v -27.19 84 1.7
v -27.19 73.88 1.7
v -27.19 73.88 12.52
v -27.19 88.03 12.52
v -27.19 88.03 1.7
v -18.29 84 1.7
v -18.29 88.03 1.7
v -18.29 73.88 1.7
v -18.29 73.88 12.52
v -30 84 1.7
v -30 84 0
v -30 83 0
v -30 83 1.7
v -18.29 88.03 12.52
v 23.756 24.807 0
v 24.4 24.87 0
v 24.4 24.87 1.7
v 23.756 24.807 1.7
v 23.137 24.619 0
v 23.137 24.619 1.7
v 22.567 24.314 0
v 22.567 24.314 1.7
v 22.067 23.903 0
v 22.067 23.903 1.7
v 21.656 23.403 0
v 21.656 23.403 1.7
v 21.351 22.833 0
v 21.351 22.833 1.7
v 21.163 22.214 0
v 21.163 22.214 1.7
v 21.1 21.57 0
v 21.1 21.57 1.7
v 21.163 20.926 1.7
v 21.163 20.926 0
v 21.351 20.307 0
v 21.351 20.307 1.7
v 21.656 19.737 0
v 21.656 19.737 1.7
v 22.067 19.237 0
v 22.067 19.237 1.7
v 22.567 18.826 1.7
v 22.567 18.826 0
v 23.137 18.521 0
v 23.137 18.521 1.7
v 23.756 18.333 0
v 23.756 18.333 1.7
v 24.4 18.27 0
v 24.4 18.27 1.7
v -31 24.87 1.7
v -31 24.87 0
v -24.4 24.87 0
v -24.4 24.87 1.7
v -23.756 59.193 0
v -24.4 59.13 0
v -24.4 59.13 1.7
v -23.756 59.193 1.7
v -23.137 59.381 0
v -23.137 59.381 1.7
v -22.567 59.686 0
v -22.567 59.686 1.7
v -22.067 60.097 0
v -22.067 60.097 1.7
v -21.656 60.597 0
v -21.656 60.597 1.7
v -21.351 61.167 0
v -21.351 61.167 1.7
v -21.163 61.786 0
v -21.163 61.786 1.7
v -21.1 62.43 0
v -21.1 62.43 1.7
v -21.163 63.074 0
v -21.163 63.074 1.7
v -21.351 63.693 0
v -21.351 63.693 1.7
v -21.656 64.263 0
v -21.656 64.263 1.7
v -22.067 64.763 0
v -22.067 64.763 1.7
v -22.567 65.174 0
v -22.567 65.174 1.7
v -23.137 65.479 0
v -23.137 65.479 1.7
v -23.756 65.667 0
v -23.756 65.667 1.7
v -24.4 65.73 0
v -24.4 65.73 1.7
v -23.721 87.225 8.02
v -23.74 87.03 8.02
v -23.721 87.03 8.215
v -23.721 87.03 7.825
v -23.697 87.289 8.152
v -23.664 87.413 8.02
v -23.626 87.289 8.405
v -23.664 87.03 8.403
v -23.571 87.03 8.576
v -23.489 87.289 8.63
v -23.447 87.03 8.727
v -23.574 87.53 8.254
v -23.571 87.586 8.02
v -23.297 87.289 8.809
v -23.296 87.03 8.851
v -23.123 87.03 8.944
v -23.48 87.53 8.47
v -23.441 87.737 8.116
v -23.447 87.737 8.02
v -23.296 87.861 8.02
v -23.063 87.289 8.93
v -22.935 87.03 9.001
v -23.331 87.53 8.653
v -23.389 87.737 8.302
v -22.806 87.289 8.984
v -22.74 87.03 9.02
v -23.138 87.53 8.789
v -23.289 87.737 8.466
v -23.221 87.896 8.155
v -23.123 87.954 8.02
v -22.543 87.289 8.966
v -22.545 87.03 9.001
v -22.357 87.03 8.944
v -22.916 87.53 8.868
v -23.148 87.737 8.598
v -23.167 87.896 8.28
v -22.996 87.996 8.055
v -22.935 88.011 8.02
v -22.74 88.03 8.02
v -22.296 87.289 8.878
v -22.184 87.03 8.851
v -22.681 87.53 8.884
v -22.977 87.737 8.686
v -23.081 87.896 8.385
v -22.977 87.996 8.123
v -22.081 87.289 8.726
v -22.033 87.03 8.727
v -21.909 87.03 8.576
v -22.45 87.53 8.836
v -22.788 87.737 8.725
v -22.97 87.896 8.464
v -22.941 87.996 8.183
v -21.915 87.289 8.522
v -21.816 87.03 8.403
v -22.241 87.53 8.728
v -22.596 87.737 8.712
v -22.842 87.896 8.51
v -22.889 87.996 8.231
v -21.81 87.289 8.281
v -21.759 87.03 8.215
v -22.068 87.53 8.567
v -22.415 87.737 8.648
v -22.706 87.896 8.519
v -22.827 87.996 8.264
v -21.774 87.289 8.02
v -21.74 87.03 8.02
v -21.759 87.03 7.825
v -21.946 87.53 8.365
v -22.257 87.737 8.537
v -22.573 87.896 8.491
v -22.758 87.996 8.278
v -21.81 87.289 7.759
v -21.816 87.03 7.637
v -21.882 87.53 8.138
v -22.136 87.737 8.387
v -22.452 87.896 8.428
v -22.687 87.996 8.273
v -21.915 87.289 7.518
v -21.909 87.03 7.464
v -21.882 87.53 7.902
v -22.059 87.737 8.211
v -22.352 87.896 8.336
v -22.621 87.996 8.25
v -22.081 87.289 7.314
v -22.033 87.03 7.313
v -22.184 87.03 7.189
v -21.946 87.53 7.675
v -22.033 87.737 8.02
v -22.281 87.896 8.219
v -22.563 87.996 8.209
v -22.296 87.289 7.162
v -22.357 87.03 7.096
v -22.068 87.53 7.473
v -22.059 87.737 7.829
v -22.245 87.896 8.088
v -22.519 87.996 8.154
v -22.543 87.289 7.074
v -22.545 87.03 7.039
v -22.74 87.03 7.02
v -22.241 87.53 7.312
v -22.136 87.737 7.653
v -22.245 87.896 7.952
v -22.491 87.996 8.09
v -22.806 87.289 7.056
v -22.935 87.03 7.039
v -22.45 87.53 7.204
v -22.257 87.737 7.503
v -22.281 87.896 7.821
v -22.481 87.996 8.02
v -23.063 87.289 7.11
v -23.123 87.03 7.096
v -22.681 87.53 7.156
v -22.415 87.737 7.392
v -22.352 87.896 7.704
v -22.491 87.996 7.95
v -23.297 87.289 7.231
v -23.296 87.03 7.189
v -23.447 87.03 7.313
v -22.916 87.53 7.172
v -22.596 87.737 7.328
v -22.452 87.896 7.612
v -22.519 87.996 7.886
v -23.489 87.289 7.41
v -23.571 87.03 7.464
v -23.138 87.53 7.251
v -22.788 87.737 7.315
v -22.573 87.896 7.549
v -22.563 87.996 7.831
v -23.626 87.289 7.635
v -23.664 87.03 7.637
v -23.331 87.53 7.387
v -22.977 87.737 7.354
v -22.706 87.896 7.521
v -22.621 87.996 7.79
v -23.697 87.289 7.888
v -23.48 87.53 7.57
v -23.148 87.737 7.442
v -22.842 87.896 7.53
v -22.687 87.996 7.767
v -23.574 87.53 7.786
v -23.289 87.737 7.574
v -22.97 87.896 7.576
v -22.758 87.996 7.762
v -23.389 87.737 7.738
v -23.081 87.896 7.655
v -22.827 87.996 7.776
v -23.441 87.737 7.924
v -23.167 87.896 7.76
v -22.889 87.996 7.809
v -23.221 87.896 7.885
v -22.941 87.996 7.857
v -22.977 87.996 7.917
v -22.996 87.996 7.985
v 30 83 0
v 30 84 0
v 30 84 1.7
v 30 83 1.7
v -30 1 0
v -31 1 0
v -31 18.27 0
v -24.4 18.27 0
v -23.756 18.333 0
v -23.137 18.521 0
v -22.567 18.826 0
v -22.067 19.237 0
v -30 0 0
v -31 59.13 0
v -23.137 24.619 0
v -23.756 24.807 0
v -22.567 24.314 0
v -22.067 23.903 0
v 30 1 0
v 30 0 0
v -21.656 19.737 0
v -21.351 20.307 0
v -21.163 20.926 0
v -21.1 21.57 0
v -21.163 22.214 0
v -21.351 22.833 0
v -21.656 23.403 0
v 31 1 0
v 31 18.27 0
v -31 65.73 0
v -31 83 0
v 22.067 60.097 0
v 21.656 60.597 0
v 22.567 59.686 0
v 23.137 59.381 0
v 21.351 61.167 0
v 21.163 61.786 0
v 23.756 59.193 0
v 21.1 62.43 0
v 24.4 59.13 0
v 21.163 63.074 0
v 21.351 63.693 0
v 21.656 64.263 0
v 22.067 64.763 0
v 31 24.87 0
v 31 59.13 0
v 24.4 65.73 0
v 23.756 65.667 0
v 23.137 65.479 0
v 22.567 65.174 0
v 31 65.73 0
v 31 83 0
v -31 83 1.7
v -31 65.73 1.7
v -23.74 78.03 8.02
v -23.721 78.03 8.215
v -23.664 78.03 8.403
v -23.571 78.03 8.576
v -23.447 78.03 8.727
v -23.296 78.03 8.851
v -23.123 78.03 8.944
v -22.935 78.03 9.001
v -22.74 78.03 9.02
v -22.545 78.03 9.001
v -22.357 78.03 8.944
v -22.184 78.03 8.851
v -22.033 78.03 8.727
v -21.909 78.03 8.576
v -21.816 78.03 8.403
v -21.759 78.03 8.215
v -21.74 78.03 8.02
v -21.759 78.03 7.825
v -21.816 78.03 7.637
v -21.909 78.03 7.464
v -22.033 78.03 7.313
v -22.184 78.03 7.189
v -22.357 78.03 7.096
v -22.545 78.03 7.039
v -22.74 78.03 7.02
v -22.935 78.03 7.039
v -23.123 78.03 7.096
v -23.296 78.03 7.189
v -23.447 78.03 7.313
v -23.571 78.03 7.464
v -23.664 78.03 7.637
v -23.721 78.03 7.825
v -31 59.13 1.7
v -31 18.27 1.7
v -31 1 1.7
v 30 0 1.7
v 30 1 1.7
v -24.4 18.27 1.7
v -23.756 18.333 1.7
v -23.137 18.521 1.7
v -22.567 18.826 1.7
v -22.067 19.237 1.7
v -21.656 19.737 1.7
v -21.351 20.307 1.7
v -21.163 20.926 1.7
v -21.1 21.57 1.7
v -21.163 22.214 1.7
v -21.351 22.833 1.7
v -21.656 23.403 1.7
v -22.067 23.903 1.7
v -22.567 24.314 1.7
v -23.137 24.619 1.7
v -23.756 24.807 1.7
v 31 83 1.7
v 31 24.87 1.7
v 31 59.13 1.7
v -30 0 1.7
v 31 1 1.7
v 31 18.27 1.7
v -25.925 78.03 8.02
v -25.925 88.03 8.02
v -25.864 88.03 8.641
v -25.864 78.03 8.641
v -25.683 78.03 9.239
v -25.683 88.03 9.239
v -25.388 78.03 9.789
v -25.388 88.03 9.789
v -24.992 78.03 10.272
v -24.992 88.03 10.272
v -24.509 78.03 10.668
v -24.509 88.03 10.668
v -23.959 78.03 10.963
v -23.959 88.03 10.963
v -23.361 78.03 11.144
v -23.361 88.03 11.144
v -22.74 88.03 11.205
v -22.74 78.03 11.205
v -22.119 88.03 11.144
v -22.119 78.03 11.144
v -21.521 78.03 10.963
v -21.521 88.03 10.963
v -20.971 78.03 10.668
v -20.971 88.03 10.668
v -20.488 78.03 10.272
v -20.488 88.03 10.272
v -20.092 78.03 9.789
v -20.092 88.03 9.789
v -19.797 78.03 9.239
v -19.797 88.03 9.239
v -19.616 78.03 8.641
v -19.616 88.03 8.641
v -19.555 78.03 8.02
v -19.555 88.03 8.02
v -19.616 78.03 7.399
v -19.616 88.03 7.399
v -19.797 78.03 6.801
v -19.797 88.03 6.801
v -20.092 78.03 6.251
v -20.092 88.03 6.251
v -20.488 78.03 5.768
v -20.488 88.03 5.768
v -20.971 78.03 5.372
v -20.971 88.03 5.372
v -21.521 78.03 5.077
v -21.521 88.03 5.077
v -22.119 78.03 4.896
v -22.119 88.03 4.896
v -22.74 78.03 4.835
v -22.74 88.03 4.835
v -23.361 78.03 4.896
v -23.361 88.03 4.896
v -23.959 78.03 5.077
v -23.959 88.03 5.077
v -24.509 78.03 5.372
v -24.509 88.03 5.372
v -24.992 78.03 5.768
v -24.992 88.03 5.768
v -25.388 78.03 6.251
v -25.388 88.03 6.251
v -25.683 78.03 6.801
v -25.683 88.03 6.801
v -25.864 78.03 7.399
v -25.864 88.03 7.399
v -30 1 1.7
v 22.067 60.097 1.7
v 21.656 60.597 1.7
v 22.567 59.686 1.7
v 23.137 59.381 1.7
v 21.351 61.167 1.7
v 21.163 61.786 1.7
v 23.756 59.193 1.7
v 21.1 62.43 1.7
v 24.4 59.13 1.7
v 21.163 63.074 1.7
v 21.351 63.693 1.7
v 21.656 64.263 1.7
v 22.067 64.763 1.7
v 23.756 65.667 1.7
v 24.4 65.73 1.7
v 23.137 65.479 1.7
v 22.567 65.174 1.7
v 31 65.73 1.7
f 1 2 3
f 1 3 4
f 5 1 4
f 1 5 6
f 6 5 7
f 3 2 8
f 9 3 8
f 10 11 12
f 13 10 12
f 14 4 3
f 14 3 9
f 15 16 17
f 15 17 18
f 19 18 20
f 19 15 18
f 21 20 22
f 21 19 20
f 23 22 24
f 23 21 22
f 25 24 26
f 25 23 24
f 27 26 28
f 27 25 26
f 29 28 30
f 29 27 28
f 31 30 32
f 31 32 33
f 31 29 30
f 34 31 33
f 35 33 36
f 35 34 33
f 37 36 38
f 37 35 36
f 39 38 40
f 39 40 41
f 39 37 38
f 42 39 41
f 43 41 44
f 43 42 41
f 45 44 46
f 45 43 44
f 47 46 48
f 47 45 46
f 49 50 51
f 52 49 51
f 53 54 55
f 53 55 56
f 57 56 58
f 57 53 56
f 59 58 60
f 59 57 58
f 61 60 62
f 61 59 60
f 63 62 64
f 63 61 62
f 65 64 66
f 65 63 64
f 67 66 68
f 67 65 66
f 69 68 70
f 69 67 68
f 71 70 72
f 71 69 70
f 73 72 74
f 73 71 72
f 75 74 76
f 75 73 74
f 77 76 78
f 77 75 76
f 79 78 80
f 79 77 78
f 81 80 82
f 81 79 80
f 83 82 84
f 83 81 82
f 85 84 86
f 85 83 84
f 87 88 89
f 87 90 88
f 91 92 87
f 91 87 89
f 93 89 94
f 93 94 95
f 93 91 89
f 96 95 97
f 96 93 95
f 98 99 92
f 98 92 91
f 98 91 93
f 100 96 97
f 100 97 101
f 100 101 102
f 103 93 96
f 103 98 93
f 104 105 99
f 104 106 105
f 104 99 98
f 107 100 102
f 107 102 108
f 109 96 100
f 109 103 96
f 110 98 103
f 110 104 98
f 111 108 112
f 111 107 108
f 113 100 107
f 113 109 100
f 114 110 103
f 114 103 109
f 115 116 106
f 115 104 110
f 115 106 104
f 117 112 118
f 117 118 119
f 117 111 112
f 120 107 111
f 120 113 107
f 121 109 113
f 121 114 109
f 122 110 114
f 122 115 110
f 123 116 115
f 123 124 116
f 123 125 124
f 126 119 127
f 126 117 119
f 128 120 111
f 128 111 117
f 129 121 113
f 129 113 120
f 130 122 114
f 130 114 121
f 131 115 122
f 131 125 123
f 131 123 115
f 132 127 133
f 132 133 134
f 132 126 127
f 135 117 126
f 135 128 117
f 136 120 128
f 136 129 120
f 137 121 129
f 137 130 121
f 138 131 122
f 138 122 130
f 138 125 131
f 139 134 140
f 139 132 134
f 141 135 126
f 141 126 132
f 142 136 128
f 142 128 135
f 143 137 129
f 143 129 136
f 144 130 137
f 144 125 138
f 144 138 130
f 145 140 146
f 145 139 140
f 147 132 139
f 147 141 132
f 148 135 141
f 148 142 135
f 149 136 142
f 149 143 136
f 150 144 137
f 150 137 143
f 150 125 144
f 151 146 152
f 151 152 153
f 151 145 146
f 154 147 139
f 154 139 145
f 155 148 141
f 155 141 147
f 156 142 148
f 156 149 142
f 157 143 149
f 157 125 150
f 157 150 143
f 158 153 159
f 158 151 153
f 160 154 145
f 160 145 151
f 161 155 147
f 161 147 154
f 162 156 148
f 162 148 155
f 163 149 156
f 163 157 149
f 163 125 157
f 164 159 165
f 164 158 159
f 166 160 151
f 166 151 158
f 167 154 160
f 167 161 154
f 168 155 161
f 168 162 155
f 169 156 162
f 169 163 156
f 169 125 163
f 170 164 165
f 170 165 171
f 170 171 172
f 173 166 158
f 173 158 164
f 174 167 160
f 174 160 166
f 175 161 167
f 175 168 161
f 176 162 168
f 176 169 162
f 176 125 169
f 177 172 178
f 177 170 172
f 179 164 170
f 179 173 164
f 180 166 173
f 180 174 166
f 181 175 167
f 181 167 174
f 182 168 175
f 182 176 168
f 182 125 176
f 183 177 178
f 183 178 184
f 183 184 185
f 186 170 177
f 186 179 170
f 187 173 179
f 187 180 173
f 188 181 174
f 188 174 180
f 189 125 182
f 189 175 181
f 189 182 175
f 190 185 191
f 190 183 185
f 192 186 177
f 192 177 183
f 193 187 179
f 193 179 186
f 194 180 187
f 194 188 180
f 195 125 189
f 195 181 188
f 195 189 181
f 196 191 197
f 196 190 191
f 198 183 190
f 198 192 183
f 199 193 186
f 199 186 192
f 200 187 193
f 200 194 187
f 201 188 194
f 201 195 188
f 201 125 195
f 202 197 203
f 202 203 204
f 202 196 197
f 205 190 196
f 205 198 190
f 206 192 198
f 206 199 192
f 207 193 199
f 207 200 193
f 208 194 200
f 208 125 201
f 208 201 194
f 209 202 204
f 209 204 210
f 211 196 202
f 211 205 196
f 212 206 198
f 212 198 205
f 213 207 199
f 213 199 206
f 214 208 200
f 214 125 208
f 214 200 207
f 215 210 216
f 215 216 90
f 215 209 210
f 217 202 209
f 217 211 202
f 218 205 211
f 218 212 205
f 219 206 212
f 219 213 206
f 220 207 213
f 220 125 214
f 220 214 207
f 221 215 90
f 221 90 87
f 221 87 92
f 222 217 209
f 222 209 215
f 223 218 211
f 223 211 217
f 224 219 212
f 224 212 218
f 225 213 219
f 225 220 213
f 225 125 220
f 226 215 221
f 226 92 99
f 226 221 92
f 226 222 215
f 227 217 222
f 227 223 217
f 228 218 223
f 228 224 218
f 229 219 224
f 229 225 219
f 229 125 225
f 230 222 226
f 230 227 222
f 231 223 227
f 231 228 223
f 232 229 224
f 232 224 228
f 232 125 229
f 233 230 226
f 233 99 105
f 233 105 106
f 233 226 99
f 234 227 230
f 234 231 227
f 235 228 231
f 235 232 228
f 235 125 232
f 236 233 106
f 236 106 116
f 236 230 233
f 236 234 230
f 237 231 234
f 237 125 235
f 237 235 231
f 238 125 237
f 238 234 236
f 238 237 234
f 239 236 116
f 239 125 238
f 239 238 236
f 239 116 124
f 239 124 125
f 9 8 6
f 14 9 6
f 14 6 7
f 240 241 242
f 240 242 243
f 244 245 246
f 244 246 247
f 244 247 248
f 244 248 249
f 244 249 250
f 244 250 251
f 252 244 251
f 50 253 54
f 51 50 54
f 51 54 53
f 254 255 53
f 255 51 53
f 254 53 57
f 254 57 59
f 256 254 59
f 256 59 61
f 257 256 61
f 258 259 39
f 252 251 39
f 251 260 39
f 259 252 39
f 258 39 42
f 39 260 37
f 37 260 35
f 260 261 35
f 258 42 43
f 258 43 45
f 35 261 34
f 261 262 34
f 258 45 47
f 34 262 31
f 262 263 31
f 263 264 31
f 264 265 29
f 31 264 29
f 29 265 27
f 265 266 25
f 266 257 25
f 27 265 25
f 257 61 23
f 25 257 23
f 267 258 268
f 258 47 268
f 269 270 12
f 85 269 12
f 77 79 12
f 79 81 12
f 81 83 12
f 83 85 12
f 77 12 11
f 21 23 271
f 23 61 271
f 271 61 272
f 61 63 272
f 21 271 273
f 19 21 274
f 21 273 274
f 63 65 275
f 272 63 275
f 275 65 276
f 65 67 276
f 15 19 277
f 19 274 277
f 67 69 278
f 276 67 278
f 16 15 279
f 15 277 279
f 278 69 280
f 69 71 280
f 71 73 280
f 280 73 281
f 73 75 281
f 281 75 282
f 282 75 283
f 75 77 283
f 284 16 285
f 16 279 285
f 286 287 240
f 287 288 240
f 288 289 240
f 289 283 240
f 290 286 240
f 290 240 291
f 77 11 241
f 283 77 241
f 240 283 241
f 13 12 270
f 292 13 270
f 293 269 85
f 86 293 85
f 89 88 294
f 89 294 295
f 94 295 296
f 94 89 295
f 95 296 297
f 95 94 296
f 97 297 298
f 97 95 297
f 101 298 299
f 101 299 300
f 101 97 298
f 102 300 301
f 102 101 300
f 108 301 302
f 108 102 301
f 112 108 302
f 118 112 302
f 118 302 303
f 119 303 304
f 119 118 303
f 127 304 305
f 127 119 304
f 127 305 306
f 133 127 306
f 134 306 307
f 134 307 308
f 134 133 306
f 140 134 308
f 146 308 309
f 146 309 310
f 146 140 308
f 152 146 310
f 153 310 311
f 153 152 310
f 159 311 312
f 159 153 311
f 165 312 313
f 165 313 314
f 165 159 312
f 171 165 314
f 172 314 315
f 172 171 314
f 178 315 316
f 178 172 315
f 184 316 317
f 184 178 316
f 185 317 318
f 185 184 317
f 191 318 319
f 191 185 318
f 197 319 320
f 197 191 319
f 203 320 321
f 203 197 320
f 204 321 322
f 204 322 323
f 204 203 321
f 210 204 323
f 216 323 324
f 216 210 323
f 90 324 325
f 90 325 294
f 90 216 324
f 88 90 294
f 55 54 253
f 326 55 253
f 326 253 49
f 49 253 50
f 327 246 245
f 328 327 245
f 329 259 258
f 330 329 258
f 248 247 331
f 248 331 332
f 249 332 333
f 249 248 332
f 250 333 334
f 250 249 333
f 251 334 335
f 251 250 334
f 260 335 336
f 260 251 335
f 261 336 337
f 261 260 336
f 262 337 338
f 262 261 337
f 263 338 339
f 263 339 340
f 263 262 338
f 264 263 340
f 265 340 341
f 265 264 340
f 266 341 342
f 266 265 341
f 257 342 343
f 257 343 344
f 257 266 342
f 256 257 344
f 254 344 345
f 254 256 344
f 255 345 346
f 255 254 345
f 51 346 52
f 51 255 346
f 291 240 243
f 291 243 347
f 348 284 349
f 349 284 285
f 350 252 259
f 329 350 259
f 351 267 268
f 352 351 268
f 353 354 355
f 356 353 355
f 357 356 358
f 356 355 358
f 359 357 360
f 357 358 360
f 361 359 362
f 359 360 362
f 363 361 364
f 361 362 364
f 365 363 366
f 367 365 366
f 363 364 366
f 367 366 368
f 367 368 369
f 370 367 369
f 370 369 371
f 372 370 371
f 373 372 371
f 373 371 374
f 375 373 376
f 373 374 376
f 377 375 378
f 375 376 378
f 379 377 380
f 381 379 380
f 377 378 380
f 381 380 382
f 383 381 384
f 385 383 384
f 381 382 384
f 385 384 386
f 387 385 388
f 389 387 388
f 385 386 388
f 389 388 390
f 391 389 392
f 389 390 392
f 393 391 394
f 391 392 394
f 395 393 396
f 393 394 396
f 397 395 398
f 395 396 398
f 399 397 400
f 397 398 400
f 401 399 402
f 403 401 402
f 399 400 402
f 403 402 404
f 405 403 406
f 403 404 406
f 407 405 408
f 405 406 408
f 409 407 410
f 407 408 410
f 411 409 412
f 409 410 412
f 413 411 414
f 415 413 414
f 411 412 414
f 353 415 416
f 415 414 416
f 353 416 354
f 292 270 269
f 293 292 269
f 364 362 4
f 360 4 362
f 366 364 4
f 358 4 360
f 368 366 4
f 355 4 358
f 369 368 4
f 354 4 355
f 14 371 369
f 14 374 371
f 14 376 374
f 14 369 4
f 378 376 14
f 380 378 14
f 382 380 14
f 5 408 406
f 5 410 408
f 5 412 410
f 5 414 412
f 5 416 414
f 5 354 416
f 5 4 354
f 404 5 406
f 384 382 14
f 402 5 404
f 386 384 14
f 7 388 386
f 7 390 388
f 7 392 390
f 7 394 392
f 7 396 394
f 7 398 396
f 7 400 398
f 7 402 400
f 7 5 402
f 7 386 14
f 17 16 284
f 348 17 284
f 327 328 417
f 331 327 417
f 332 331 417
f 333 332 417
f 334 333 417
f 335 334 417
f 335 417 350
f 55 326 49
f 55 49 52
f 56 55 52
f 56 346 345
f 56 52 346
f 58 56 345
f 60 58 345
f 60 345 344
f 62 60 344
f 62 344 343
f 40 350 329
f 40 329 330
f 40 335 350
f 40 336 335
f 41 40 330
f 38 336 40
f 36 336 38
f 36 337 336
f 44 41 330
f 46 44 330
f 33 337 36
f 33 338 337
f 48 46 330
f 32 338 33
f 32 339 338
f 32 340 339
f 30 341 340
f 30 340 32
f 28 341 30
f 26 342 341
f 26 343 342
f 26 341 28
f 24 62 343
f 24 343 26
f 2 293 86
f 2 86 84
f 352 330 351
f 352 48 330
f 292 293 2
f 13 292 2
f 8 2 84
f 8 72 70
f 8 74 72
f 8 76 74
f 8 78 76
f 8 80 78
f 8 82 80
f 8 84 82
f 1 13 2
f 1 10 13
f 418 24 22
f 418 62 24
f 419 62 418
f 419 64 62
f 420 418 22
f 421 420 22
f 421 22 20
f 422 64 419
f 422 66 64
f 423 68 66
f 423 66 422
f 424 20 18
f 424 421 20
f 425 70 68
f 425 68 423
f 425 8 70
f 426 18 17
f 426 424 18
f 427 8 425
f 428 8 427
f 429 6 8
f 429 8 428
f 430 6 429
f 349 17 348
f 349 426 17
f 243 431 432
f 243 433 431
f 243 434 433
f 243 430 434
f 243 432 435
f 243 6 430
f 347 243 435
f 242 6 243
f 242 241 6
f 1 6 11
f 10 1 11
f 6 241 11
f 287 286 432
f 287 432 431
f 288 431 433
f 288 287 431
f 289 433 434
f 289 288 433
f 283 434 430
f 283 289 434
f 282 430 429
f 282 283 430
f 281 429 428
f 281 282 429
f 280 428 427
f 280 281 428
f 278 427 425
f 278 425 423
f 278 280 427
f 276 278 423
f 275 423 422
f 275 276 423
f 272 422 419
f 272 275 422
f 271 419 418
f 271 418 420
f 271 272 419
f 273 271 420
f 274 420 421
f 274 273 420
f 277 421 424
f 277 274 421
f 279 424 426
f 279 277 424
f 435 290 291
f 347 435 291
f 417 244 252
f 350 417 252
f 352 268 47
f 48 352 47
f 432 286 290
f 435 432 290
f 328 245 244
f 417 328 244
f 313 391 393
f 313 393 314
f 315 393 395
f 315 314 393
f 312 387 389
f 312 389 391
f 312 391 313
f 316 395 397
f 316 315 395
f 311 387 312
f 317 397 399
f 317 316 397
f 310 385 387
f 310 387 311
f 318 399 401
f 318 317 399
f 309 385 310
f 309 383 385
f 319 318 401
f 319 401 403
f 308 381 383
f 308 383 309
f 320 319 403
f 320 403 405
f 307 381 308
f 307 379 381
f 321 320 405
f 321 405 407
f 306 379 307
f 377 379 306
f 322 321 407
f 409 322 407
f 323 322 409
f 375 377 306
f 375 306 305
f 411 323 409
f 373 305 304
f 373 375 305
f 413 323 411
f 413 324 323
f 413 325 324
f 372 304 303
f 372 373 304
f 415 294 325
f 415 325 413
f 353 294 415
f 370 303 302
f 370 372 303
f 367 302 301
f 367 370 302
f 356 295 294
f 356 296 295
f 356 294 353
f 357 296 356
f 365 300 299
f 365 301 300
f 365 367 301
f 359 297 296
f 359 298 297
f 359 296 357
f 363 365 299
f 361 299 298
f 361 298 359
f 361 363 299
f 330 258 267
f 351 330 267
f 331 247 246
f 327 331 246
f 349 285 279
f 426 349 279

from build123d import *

# Parameters (mm, degrees)
PAD_DEPTH       = 1.7
SKETCH001_W     = 8.9
SKETCH001_H     = 14.15
PAD010_DEPTH    = 10.82
SKETCH021_R     = 3.185
SKETCH021_R_2   = 1
POCKET010_DEPTH = 10
FILLET014_R     = 1


with BuildPart() as part:
    # Sketch → Pad (new body)
    with BuildSketch(Plane.XY):
        with BuildLine():
            Line((0, 0), (30, 0))
            Line((30, 0), (30, 1))
            Line((30, 1), (31, 1))
            Line((31, 1), (31, 18.27))
            Line((31, 18.27), (24.4, 18.27))
            ThreePointArc((24.4, 24.87), (21.1, 21.57), (24.4, 18.27))
            Line((24.4, 24.87), (31, 24.87))
            Line((31, 24.87), (31, 59.13))
            Line((31, 59.13), (24.4, 59.13))
            ThreePointArc((24.4, 65.73), (21.1, 62.43), (24.4, 59.13))
            Line((24.4, 65.73), (31, 65.73))
            Line((31, 65.73), (31, 83))
            Line((30, 83), (31, 83))
            Line((30, 84), (30, 83))
            Line((30, 84), (0, 84))
            Line((0, 84), (-30, 84))
            Line((-30, 84), (-30, 83))
            Line((-30, 83), (-31, 83))
            Line((-31, 83), (-31, 65.73))
            Line((-31, 65.73), (-24.4, 65.73))
            ThreePointArc((-24.4, 59.13), (-21.1, 62.43), (-24.4, 65.73))
            Line((-24.4, 59.13), (-31, 59.13))
            Line((-31, 59.13), (-31, 24.87))
            Line((-31, 24.87), (-24.4, 24.87))
            ThreePointArc((-24.4, 18.27), (-21.1, 21.57), (-24.4, 24.87))
            Line((-24.4, 18.27), (-31, 18.27))
            Line((-31, 18.27), (-31, 1))
            Line((-31, 1), (-30, 1))
            Line((-30, 1), (-30, 0))
            Line((-30, 0), (0, 0))
        make_face()
    extrude(amount=PAD_DEPTH)

    # Sketch001 → Pad010 (new body)
    with BuildSketch(Plane.XY.offset(1.7)):
        with Locations((-22.74, 80.955)):
            Rectangle(SKETCH001_W, SKETCH001_H)
    extrude(amount=PAD010_DEPTH)

    # Sketch021 → Pocket010 (cut)
    with BuildSketch(Plane(origin=(0, 88.03, 0), x_dir=(-1, 0, 0), z_dir=(0, 1, 0))):
        with Locations((22.74, 8.02)):
            Circle(SKETCH021_R)
        with Locations((22.74, 8.02)):
            Circle(SKETCH021_R_2, mode=Mode.SUBTRACT)
    extrude(amount=-POCKET010_DEPTH, mode=Mode.SUBTRACT)

    # Fillet014
    fillet014_edges = [part.edges().sort_by_distance(p)[0] for p in [
        (-21.74, 88.03, 8.02),
    ]]
    fillet(fillet014_edges, radius=FILLET014_R)


solid = part.part
